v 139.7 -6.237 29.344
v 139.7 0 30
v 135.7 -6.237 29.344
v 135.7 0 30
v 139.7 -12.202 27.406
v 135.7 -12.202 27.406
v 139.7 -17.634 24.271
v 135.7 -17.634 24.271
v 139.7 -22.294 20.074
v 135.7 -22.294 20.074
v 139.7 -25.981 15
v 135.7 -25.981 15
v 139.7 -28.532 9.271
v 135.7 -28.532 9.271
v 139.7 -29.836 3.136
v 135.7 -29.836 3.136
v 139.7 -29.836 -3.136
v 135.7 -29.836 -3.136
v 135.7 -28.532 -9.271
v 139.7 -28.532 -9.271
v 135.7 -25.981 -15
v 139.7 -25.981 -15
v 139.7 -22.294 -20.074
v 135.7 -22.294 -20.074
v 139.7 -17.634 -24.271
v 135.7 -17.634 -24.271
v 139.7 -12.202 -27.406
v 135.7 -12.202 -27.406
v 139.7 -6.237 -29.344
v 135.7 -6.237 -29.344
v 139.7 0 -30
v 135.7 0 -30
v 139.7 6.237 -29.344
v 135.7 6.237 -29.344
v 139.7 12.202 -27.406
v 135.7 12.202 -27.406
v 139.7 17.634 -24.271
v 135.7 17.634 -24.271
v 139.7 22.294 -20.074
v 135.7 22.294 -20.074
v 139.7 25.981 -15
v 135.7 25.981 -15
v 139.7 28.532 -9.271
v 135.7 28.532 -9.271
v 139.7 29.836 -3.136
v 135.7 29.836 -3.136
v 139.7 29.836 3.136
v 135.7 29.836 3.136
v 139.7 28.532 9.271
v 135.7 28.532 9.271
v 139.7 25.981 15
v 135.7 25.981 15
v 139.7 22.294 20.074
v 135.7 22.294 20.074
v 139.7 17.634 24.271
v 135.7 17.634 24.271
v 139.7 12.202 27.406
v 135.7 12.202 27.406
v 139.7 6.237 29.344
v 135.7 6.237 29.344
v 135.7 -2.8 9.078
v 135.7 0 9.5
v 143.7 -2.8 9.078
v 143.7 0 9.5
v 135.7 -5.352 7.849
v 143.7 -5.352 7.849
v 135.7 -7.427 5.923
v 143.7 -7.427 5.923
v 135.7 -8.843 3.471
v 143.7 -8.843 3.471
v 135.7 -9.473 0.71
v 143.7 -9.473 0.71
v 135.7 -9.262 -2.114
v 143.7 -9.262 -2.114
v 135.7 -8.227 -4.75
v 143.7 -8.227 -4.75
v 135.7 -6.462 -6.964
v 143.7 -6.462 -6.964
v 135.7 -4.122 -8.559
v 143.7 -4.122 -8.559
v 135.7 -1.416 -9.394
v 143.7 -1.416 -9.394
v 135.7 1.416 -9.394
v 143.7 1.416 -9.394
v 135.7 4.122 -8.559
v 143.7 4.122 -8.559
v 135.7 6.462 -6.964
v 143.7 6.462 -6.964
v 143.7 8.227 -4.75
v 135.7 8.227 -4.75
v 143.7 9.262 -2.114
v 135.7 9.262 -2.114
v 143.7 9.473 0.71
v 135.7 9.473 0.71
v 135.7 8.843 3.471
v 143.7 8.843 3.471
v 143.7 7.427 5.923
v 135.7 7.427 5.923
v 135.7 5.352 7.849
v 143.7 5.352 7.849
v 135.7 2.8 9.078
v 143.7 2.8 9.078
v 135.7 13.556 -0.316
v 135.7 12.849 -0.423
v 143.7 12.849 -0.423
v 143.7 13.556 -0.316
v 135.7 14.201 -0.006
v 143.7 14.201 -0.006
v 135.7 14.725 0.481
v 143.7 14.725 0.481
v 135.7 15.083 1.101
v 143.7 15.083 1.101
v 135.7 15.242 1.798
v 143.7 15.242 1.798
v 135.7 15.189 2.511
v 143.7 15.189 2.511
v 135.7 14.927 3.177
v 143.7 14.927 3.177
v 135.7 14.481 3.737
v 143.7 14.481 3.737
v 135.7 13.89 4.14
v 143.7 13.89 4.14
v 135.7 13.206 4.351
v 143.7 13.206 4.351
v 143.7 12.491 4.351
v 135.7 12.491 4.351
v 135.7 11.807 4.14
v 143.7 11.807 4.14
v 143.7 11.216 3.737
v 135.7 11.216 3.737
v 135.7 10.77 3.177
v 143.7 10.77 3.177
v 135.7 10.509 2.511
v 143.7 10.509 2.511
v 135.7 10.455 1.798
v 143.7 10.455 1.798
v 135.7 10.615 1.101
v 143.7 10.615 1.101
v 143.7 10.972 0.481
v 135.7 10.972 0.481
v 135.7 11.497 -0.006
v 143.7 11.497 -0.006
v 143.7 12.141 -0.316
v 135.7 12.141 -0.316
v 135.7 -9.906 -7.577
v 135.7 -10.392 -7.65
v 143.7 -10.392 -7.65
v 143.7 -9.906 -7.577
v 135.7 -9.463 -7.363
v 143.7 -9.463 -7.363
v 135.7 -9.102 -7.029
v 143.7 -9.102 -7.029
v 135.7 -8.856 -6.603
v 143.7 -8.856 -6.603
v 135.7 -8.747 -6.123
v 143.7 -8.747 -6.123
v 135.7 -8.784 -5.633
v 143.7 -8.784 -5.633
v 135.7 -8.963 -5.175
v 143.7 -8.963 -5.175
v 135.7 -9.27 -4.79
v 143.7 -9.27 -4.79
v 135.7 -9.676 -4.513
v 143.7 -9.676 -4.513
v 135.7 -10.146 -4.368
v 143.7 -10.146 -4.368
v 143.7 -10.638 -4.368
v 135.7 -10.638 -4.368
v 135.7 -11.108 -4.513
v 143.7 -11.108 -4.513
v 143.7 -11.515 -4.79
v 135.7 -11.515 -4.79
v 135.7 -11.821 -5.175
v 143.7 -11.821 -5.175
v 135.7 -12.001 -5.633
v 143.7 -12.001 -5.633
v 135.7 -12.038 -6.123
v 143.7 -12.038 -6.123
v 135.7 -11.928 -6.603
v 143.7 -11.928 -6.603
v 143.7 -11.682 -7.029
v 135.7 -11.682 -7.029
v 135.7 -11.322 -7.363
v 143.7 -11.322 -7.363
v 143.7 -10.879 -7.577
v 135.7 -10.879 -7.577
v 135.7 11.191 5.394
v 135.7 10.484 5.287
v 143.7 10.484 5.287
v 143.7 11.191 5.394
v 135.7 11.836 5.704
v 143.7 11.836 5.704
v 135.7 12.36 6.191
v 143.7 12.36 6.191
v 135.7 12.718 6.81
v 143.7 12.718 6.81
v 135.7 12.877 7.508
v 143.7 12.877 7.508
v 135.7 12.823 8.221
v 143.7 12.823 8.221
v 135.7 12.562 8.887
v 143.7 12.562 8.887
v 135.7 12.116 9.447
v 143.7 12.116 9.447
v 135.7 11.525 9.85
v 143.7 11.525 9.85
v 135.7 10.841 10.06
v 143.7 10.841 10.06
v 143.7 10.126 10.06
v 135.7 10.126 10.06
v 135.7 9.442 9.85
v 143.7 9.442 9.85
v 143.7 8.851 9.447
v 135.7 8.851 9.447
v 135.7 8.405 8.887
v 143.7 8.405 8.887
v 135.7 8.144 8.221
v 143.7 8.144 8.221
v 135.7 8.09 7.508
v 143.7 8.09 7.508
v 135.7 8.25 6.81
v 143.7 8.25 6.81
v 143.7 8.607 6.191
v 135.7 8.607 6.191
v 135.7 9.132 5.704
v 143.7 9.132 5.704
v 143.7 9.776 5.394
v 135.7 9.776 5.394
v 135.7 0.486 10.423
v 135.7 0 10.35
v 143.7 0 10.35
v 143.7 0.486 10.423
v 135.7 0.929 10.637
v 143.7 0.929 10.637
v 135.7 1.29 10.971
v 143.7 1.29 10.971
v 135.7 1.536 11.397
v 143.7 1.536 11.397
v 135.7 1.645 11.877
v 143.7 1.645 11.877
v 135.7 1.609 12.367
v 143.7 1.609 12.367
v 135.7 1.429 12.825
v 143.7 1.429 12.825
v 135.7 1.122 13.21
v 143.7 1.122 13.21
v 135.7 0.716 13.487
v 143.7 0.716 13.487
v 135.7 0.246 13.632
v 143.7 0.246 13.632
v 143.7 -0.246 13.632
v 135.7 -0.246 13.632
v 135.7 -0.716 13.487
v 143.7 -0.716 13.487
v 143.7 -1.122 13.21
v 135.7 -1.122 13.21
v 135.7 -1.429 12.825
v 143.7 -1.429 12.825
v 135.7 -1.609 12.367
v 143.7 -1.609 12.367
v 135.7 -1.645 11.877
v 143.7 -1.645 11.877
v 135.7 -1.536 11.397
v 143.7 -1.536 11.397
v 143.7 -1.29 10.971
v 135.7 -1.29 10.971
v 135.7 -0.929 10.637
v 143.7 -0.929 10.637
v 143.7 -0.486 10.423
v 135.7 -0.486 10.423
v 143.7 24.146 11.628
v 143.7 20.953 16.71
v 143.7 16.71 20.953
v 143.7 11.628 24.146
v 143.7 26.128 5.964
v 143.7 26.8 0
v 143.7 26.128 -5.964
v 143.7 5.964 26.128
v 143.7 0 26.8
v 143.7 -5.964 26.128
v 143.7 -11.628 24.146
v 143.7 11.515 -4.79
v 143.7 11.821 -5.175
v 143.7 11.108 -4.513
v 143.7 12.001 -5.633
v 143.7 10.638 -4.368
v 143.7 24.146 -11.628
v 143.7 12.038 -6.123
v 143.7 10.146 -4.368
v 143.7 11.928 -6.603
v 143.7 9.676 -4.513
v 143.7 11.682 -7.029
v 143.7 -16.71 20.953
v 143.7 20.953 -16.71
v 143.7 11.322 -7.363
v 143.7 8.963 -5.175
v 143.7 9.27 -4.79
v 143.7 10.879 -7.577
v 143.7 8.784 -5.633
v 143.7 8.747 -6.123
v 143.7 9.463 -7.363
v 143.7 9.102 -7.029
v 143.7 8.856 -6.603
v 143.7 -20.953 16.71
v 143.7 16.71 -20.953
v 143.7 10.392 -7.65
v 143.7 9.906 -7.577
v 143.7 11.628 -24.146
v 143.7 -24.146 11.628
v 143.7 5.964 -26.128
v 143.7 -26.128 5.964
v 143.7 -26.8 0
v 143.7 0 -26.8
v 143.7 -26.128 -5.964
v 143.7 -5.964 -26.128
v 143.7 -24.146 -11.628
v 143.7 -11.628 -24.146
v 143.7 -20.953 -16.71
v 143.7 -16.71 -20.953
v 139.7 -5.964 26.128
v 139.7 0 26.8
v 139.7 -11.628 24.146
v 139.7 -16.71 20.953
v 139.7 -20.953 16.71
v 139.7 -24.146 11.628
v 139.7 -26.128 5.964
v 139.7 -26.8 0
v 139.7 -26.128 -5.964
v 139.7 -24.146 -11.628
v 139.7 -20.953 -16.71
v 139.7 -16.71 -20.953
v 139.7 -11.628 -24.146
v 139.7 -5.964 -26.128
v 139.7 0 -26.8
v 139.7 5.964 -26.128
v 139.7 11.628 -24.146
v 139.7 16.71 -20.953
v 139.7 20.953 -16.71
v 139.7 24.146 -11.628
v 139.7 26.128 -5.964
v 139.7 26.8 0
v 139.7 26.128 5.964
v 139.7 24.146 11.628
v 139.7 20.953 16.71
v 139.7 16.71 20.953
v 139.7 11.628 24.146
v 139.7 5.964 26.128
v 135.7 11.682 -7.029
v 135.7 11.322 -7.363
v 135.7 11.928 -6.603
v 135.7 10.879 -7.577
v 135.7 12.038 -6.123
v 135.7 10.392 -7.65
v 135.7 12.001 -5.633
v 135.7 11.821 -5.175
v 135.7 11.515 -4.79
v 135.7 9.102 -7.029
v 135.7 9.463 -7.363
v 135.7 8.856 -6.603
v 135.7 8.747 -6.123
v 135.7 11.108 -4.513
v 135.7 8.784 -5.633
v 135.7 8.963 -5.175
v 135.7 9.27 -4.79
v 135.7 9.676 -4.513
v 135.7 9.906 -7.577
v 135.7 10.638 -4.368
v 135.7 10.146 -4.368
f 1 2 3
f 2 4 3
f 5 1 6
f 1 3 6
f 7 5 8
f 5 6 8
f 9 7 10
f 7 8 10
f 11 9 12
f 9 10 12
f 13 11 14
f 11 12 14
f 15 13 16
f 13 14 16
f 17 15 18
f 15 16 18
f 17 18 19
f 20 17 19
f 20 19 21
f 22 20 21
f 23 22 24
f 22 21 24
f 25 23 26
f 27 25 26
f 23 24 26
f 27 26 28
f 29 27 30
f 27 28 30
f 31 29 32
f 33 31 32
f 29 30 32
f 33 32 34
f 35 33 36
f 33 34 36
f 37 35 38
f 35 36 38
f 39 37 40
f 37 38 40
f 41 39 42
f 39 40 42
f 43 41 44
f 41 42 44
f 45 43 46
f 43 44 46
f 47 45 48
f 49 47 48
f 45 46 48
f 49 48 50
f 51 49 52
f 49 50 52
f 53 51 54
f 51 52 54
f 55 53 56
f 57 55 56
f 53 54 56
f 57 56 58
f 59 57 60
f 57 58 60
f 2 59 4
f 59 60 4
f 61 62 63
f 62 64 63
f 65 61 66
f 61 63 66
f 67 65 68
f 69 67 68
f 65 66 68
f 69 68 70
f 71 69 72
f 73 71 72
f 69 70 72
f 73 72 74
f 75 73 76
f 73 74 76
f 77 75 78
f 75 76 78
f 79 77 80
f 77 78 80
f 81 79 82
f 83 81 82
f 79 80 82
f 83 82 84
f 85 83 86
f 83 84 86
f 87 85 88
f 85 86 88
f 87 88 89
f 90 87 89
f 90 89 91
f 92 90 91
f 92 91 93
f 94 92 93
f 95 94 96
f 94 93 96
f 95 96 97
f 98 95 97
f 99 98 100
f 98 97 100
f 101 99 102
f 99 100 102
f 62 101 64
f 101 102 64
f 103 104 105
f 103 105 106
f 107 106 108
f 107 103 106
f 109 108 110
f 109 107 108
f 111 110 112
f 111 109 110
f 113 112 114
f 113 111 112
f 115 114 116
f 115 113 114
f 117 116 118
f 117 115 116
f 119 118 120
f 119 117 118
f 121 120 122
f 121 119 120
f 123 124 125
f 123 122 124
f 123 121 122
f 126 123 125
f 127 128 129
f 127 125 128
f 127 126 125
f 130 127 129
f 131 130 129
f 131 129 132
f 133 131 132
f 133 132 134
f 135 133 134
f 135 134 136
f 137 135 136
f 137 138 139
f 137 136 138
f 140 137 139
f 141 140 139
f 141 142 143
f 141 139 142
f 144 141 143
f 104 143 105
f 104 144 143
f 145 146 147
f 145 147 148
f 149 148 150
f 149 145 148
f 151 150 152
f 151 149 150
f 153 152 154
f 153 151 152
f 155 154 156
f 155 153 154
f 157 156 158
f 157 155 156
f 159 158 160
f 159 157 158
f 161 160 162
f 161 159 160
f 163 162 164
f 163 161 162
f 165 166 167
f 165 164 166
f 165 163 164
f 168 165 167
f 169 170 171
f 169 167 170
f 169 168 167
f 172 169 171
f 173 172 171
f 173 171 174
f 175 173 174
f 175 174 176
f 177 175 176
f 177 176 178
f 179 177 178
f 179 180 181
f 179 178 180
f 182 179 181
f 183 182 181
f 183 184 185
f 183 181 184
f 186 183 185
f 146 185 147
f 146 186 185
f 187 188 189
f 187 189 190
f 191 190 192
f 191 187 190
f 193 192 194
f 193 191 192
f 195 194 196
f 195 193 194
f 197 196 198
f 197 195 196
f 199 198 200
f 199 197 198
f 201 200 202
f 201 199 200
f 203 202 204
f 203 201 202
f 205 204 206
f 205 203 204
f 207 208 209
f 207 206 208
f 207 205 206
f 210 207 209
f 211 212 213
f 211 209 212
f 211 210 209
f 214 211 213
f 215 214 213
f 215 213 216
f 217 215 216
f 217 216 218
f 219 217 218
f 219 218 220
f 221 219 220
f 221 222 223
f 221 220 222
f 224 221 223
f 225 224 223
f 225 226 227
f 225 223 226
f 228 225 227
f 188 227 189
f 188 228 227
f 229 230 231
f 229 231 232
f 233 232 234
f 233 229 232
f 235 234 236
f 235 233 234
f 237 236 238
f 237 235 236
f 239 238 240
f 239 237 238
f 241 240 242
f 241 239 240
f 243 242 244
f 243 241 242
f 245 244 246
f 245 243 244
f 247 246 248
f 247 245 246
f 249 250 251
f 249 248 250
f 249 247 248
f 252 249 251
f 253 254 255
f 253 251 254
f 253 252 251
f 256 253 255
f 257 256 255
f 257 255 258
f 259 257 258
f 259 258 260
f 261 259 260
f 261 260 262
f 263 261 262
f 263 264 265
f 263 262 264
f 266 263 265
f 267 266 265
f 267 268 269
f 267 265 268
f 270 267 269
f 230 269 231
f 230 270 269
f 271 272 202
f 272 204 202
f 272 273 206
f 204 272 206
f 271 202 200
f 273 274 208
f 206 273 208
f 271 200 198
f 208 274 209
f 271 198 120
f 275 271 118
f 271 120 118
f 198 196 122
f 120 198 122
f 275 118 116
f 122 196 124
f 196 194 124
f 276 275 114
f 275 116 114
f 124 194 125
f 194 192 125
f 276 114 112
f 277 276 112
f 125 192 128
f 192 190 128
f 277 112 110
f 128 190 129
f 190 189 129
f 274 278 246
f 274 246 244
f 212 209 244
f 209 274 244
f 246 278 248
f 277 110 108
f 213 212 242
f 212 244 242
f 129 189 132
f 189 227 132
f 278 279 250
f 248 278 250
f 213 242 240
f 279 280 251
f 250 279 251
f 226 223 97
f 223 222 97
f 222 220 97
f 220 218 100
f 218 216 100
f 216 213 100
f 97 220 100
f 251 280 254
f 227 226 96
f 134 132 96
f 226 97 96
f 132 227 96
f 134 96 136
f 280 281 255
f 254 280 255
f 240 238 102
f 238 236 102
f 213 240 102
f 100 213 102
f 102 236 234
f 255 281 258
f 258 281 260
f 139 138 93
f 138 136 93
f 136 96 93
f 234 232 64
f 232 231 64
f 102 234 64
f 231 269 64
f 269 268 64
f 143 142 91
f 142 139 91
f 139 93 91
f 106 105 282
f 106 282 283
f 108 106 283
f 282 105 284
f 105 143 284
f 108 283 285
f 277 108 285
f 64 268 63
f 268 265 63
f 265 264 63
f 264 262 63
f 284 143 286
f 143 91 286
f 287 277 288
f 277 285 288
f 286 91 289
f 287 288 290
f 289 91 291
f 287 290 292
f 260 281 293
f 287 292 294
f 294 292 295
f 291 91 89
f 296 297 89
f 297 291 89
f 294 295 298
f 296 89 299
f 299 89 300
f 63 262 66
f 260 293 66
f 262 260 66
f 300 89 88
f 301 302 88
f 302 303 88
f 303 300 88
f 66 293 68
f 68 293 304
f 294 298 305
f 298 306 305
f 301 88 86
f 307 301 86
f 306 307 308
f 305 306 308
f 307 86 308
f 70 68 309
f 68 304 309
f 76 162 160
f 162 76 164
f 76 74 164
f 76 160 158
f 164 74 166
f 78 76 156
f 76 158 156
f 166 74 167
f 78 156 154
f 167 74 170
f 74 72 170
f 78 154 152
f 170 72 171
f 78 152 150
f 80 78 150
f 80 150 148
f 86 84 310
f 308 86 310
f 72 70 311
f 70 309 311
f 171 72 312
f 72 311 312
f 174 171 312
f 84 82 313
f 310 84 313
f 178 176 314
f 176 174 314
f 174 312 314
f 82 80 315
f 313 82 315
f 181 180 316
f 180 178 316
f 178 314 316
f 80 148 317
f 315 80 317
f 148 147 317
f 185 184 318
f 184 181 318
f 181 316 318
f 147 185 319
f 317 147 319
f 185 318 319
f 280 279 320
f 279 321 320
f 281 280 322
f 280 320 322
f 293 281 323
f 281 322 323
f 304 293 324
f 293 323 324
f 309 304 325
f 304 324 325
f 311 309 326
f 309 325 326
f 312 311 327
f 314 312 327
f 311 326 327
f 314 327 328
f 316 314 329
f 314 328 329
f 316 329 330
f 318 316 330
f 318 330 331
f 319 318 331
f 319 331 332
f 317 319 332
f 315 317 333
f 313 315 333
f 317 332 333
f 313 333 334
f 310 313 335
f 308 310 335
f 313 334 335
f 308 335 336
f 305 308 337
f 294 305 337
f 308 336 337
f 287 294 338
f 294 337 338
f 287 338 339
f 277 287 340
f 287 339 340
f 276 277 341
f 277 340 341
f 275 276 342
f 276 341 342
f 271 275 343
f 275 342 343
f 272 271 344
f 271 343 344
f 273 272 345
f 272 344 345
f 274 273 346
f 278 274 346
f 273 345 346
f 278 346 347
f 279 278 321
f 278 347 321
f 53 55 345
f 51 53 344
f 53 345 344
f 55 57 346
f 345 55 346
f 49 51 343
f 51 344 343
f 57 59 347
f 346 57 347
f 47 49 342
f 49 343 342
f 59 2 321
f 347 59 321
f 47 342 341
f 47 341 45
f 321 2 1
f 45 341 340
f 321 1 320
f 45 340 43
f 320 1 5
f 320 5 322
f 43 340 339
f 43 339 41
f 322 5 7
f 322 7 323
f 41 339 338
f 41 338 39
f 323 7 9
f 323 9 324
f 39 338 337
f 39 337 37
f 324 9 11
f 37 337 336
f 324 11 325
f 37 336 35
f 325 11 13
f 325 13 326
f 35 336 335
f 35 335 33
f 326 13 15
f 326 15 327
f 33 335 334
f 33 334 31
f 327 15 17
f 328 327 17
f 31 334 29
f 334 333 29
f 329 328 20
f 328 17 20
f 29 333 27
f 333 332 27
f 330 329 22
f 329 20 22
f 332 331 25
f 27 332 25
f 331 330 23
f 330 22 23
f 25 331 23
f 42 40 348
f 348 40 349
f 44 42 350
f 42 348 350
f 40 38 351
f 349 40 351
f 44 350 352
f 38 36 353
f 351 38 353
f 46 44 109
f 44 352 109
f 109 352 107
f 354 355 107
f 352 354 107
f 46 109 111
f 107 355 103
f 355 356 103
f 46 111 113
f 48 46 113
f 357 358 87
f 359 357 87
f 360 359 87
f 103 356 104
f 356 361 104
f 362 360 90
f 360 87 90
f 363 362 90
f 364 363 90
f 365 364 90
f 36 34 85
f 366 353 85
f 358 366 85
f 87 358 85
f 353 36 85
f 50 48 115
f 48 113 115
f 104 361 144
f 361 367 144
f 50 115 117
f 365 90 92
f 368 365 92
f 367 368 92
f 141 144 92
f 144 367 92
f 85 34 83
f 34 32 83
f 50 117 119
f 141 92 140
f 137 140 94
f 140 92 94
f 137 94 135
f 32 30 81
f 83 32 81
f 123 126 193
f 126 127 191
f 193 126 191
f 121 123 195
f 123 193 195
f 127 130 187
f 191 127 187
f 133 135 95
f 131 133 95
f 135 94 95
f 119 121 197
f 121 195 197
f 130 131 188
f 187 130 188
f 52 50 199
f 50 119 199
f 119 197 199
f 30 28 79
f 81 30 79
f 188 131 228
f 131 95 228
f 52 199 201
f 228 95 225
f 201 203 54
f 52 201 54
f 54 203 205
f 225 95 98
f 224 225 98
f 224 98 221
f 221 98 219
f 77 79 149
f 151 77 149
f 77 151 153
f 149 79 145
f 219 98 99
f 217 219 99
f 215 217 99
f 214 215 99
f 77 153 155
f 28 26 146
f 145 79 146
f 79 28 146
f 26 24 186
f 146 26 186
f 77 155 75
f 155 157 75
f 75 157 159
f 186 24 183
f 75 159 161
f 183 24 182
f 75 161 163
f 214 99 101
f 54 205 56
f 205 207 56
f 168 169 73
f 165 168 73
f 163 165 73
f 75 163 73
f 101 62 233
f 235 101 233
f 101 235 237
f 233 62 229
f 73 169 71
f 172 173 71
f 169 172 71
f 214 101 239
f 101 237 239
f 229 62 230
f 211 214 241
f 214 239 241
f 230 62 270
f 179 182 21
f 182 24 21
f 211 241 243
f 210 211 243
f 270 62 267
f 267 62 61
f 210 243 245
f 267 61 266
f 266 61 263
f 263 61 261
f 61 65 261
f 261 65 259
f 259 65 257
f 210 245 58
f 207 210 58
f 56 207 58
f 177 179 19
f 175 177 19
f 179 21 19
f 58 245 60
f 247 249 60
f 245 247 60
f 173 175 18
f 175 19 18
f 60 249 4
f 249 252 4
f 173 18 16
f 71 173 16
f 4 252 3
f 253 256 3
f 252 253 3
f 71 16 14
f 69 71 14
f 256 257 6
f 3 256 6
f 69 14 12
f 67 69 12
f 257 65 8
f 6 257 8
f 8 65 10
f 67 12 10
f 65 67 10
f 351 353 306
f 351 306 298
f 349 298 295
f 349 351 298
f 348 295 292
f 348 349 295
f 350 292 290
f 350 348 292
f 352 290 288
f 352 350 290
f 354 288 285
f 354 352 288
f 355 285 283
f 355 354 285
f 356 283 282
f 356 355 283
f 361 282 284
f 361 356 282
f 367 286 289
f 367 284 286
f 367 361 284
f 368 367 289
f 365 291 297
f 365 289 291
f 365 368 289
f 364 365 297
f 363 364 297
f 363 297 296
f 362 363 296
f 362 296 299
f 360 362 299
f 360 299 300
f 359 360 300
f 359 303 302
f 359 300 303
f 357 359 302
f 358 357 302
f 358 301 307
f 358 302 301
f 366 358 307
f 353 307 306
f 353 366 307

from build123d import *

# Parameters (mm, degrees)
AXIAL_HOLES_DEPTH      = 150.832206151
AXIAL_HOLES_DEPTH_BACK = 150.832206151
SKETCH2_R              = 2.4
SKETCH2_R_2            = 1.65


with BuildPart() as part:
    # Axial profile (mm) → Full revolution (revolve)
    with BuildSketch(Plane.XY, mode=Mode.PRIVATE) as full_revolution_sk:
        Polygon((135.7, 9.5), (143.7, 9.5), (143.7, 26.8), (139.7, 26.8), (139.7, 30), (135.7, 30), align=None)
    revolve(full_revolution_sk.sketch.rotate(Axis((-110, 0, 0), (1, 0, 0)), 90), axis=Axis((-110, 0, 0), (1, 0, 0)))

    # Sketch2 → Axial holes (cut, two sides: drawn at the far end of the back side and taken through both)
    with BuildSketch(Plane(origin=(0, 0, 0), x_dir=(0, 0, -1), z_dir=(1, 0, 0)).offset(-AXIAL_HOLES_DEPTH_BACK)):
        with Locations((-1.977382665, 12.848733704)):
            Circle(SKETCH2_R)
        with Locations((-7.687206041, 10.483647423)):
            Circle(SKETCH2_R)
        with Locations((-12, 0)):
            Circle(SKETCH2_R_2)
        with Locations((6, -10.392304845)):
            Circle(SKETCH2_R_2)
        with Locations((6, 10.392304845)):
            Circle(SKETCH2_R_2)
    extrude(amount=AXIAL_HOLES_DEPTH + AXIAL_HOLES_DEPTH_BACK, mode=Mode.SUBTRACT)


solid = part.part
